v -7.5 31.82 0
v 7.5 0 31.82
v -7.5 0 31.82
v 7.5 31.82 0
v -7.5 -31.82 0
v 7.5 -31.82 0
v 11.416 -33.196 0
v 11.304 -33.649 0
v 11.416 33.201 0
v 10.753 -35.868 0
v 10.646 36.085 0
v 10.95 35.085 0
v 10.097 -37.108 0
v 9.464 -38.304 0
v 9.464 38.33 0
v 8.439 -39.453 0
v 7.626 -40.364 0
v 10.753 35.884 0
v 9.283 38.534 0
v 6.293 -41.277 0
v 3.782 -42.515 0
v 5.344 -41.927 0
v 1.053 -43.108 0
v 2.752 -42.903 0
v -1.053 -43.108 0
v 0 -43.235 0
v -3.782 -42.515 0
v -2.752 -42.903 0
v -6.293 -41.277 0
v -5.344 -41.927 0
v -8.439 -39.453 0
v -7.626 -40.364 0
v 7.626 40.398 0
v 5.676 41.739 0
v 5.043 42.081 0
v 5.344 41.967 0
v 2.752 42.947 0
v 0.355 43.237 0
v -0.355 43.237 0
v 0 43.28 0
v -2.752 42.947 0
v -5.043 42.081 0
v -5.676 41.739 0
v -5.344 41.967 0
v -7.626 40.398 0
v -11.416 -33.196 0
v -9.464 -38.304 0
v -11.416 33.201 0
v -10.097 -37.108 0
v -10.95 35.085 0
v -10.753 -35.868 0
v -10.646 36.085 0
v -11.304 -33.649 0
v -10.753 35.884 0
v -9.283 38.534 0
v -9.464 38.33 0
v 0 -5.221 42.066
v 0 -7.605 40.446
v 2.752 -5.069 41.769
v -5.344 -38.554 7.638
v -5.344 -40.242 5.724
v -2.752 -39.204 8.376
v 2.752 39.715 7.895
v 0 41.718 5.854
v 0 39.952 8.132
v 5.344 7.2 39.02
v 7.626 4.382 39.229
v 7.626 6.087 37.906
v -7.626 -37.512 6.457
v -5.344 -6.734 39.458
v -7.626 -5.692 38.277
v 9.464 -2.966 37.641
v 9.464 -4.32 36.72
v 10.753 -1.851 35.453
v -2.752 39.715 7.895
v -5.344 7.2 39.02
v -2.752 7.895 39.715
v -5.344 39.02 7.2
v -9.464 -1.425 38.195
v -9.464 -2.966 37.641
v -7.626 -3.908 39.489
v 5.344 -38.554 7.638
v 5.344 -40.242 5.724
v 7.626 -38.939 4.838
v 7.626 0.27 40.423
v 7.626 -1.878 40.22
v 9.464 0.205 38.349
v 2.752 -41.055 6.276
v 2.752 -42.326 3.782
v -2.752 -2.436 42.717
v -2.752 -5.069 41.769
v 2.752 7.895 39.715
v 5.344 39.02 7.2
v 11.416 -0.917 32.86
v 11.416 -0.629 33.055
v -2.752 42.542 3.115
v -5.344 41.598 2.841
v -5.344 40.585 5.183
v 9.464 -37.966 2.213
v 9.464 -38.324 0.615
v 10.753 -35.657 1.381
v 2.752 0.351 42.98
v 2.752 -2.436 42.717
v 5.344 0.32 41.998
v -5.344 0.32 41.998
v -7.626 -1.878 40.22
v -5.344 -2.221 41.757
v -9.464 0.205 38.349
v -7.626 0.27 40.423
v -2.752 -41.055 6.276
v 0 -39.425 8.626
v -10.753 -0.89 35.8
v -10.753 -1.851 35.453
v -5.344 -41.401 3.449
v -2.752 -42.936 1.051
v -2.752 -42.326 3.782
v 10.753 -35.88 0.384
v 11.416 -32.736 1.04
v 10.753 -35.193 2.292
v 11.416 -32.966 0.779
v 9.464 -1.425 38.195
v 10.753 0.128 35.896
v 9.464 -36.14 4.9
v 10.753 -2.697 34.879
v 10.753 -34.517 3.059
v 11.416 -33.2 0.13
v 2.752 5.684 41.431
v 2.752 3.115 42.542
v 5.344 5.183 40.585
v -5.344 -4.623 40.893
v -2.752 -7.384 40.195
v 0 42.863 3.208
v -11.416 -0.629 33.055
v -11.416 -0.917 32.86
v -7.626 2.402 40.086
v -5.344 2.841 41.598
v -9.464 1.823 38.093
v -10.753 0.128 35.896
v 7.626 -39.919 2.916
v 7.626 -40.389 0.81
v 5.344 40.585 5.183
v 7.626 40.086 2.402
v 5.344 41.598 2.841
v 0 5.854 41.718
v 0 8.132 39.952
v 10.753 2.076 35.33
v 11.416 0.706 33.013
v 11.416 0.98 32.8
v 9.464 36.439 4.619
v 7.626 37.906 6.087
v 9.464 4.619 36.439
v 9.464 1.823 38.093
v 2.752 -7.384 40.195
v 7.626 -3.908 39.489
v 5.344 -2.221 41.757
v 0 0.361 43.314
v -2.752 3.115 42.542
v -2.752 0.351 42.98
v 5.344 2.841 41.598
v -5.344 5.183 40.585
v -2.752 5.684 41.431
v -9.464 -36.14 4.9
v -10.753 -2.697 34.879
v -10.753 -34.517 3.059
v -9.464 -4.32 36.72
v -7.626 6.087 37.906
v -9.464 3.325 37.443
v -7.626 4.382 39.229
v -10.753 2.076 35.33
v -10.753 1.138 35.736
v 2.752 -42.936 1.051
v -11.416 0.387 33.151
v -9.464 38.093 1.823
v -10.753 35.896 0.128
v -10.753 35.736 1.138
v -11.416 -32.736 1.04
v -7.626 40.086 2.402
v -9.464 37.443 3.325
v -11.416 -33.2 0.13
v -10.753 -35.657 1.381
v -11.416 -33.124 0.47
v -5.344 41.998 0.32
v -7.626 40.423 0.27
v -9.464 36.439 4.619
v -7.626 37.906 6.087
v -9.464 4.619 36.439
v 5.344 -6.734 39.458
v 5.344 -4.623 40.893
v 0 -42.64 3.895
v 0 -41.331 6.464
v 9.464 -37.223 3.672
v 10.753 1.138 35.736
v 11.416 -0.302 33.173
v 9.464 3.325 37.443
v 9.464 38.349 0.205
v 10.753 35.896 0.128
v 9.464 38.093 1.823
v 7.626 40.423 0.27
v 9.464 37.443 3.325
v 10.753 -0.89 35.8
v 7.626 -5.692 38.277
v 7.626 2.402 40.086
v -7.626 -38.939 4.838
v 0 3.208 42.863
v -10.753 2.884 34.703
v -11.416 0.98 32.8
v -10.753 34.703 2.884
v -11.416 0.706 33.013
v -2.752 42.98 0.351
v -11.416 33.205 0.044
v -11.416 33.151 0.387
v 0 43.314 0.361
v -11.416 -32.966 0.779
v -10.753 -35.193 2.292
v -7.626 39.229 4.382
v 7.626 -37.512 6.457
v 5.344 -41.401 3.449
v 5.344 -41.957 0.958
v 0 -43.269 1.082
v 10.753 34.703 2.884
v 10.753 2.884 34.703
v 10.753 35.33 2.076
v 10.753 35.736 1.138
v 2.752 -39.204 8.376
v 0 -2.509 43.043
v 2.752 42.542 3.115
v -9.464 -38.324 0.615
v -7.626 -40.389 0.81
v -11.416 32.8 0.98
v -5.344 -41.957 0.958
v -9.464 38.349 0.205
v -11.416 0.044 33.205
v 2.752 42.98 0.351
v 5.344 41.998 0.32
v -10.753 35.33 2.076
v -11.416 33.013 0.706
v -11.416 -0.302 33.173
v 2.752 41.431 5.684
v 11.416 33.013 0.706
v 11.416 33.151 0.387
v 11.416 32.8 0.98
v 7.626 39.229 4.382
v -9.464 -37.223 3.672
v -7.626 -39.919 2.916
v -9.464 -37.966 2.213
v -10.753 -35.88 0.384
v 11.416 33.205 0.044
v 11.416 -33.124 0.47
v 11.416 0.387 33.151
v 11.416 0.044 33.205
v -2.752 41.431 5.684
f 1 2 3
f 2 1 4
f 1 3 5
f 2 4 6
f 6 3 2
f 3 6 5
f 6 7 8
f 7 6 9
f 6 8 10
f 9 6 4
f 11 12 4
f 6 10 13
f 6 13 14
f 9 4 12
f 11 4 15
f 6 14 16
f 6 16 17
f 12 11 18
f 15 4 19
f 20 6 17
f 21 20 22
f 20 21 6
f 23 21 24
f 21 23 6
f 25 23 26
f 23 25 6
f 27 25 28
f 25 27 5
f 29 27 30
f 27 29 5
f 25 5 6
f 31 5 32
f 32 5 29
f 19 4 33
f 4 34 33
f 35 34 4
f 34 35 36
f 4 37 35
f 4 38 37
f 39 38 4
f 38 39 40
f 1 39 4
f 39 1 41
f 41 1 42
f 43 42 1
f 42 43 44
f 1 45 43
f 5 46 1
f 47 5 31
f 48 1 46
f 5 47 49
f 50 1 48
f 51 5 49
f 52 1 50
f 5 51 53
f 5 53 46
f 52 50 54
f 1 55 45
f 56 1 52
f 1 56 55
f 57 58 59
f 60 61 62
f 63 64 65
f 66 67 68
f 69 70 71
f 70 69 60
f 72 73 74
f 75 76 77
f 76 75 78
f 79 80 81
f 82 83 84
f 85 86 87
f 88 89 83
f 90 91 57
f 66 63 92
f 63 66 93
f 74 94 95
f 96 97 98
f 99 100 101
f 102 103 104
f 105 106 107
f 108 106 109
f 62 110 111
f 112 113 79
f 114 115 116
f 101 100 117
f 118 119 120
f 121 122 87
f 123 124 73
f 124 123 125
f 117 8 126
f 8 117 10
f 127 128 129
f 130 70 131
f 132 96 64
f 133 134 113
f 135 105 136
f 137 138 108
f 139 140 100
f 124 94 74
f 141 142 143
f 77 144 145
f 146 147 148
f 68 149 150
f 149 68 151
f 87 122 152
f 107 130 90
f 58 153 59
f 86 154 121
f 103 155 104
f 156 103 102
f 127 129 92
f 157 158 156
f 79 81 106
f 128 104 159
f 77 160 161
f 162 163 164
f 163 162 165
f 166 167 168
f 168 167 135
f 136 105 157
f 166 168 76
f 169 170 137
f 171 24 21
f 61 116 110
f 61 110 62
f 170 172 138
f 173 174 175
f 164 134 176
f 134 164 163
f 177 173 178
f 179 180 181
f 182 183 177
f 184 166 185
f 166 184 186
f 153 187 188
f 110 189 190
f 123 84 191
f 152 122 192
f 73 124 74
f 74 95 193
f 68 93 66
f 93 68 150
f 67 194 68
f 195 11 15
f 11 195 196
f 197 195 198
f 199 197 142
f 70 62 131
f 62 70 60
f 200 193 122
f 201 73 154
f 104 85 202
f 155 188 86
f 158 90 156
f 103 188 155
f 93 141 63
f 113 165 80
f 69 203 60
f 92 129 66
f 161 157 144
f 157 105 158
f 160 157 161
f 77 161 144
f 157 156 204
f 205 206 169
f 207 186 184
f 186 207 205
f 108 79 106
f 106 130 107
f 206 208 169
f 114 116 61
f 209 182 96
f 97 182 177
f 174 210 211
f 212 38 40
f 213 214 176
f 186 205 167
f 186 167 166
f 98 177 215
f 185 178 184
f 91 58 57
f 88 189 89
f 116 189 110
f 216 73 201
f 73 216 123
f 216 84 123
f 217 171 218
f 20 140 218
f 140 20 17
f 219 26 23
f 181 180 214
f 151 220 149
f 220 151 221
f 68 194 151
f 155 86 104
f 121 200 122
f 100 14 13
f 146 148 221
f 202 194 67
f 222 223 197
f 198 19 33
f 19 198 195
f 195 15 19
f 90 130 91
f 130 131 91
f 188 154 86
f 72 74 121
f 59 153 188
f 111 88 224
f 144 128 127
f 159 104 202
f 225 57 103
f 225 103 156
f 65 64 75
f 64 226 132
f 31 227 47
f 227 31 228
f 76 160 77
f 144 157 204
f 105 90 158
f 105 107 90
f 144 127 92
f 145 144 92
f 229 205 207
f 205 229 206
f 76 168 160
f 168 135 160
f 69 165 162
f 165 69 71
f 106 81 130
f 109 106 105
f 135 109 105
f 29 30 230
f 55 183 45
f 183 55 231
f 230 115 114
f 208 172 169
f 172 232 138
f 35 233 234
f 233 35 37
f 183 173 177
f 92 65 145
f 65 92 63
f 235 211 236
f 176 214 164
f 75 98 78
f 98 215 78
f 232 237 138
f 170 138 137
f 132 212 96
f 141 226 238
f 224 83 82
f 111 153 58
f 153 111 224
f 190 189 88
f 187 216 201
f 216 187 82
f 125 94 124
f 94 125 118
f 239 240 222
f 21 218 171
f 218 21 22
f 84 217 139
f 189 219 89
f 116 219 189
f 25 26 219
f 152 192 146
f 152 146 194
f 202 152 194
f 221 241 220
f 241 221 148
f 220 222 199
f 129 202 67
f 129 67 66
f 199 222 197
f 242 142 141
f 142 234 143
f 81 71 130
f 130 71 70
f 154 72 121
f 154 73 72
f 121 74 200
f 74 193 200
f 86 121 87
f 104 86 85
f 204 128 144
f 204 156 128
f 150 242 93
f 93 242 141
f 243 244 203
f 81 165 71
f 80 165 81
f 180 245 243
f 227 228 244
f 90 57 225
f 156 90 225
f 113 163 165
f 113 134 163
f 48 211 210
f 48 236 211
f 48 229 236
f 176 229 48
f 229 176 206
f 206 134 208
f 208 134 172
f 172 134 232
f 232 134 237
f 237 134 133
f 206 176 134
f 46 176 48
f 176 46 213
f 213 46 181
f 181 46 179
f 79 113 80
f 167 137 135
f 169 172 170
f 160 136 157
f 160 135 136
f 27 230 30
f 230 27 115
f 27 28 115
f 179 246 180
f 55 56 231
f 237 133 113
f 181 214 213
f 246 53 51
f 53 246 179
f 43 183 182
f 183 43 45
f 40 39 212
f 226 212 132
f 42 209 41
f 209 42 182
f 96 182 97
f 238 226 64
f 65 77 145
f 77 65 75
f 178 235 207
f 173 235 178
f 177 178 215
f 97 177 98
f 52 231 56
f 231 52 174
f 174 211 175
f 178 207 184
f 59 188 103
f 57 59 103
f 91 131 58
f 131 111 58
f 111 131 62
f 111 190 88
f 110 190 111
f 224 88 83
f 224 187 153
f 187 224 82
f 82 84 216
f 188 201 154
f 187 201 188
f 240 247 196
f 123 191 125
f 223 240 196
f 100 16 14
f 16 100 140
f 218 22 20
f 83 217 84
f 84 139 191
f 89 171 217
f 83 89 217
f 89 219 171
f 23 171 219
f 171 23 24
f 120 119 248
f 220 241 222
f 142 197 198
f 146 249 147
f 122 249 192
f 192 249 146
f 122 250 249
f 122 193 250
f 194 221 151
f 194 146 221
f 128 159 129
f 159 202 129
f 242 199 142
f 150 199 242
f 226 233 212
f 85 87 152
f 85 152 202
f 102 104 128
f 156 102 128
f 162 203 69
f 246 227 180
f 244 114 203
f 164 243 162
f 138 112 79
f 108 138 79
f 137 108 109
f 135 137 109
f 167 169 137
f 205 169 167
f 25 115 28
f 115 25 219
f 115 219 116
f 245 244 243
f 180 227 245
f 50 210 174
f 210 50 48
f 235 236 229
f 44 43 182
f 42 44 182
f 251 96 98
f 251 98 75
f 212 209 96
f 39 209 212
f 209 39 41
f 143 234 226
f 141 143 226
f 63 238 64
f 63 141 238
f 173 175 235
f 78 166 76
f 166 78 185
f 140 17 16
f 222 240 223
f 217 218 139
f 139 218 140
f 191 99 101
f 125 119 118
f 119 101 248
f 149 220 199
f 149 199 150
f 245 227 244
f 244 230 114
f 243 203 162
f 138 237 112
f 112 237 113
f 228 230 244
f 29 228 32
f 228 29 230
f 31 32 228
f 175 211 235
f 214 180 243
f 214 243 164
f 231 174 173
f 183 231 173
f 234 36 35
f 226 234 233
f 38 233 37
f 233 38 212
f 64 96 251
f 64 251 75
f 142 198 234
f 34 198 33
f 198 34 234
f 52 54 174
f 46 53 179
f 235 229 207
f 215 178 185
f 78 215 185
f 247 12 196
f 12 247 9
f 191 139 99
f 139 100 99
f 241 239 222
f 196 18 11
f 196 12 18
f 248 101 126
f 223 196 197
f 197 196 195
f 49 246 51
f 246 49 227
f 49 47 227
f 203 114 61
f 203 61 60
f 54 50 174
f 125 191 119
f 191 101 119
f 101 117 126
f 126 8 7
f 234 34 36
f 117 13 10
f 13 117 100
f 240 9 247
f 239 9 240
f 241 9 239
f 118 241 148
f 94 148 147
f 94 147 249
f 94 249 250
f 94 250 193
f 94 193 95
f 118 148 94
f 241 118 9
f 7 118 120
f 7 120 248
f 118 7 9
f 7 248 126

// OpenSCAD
// PROTECTIVE CORNER FOR TABLE
//////////////////////////////
//This part is meant to be placed on the corner of a table in order to avoid people from bumping into it and getting hurt
//Designed by David LE GALL on 13/04/2016 and published under the CC-BY-NC liscence
//////////////////////////////

///////////////////
//USER PARAMETERS//
///////////////////
Table_thickness=15;//Thickness of the table to protect
Part_edge_length=45;//Length of the part along the edge of the table
Part_thickness=4;//Thicknes of the part
Quality=25;//Quality of the model
Design_1_or_2=2;//First design "sticks" a little more to the shape of the table wereas second design is more rounded


//////////////////////////////////////////////
rotate([0,-90,0])rotate([0,0,45])difference(){
if ( Design_1_or_2 == 1)
{
    hull(){
        translate([Part_edge_length/2,Part_edge_length/2,Table_thickness/2])sphere(Part_thickness,$fn=Quality);
        translate([Part_edge_length/2,Part_edge_length/2,-Table_thickness/2])sphere(Part_thickness,$fn=Quality);
        translate([Part_edge_length/2,-Part_edge_length/2,Table_thickness/2])sphere(Part_thickness,$fn=Quality);
        translate([Part_edge_length/2,-Part_edge_length/2,-Table_thickness/2])sphere(Part_thickness,$fn=Quality);
        translate([-Part_edge_length/2,-Part_edge_length/2,Table_thickness/2])sphere(Part_thickness,$fn=Quality);
        translate([-Part_edge_length/2,-Part_edge_length/2,-Table_thickness/2])sphere(Part_thickness,$fn=Quality);
    }
}
if ( Design_1_or_2 == 2)
      hull(){
        translate([Part_edge_length/2,Part_edge_length/2,0])sphere(Part_thickness+Table_thickness/2,$fn=Quality);        
        translate([Part_edge_length/2,-Part_edge_length/2,0])sphere(Part_thickness+Table_thickness/2,$fn=Quality);        
        translate([-Part_edge_length/2,-Part_edge_length/2,0])sphere(Part_thickness+Table_thickness/2,$fn=Quality);
    }

union(){
cube([Part_edge_length,Part_edge_length,Table_thickness],true);
rotate([0,0,45])translate([0,2*(Part_edge_length+Part_thickness),0])cube([4*(Part_edge_length+Part_thickness),4*(Part_edge_length+Part_thickness),4*(Part_edge_length+Part_thickness)],true);
}
}
